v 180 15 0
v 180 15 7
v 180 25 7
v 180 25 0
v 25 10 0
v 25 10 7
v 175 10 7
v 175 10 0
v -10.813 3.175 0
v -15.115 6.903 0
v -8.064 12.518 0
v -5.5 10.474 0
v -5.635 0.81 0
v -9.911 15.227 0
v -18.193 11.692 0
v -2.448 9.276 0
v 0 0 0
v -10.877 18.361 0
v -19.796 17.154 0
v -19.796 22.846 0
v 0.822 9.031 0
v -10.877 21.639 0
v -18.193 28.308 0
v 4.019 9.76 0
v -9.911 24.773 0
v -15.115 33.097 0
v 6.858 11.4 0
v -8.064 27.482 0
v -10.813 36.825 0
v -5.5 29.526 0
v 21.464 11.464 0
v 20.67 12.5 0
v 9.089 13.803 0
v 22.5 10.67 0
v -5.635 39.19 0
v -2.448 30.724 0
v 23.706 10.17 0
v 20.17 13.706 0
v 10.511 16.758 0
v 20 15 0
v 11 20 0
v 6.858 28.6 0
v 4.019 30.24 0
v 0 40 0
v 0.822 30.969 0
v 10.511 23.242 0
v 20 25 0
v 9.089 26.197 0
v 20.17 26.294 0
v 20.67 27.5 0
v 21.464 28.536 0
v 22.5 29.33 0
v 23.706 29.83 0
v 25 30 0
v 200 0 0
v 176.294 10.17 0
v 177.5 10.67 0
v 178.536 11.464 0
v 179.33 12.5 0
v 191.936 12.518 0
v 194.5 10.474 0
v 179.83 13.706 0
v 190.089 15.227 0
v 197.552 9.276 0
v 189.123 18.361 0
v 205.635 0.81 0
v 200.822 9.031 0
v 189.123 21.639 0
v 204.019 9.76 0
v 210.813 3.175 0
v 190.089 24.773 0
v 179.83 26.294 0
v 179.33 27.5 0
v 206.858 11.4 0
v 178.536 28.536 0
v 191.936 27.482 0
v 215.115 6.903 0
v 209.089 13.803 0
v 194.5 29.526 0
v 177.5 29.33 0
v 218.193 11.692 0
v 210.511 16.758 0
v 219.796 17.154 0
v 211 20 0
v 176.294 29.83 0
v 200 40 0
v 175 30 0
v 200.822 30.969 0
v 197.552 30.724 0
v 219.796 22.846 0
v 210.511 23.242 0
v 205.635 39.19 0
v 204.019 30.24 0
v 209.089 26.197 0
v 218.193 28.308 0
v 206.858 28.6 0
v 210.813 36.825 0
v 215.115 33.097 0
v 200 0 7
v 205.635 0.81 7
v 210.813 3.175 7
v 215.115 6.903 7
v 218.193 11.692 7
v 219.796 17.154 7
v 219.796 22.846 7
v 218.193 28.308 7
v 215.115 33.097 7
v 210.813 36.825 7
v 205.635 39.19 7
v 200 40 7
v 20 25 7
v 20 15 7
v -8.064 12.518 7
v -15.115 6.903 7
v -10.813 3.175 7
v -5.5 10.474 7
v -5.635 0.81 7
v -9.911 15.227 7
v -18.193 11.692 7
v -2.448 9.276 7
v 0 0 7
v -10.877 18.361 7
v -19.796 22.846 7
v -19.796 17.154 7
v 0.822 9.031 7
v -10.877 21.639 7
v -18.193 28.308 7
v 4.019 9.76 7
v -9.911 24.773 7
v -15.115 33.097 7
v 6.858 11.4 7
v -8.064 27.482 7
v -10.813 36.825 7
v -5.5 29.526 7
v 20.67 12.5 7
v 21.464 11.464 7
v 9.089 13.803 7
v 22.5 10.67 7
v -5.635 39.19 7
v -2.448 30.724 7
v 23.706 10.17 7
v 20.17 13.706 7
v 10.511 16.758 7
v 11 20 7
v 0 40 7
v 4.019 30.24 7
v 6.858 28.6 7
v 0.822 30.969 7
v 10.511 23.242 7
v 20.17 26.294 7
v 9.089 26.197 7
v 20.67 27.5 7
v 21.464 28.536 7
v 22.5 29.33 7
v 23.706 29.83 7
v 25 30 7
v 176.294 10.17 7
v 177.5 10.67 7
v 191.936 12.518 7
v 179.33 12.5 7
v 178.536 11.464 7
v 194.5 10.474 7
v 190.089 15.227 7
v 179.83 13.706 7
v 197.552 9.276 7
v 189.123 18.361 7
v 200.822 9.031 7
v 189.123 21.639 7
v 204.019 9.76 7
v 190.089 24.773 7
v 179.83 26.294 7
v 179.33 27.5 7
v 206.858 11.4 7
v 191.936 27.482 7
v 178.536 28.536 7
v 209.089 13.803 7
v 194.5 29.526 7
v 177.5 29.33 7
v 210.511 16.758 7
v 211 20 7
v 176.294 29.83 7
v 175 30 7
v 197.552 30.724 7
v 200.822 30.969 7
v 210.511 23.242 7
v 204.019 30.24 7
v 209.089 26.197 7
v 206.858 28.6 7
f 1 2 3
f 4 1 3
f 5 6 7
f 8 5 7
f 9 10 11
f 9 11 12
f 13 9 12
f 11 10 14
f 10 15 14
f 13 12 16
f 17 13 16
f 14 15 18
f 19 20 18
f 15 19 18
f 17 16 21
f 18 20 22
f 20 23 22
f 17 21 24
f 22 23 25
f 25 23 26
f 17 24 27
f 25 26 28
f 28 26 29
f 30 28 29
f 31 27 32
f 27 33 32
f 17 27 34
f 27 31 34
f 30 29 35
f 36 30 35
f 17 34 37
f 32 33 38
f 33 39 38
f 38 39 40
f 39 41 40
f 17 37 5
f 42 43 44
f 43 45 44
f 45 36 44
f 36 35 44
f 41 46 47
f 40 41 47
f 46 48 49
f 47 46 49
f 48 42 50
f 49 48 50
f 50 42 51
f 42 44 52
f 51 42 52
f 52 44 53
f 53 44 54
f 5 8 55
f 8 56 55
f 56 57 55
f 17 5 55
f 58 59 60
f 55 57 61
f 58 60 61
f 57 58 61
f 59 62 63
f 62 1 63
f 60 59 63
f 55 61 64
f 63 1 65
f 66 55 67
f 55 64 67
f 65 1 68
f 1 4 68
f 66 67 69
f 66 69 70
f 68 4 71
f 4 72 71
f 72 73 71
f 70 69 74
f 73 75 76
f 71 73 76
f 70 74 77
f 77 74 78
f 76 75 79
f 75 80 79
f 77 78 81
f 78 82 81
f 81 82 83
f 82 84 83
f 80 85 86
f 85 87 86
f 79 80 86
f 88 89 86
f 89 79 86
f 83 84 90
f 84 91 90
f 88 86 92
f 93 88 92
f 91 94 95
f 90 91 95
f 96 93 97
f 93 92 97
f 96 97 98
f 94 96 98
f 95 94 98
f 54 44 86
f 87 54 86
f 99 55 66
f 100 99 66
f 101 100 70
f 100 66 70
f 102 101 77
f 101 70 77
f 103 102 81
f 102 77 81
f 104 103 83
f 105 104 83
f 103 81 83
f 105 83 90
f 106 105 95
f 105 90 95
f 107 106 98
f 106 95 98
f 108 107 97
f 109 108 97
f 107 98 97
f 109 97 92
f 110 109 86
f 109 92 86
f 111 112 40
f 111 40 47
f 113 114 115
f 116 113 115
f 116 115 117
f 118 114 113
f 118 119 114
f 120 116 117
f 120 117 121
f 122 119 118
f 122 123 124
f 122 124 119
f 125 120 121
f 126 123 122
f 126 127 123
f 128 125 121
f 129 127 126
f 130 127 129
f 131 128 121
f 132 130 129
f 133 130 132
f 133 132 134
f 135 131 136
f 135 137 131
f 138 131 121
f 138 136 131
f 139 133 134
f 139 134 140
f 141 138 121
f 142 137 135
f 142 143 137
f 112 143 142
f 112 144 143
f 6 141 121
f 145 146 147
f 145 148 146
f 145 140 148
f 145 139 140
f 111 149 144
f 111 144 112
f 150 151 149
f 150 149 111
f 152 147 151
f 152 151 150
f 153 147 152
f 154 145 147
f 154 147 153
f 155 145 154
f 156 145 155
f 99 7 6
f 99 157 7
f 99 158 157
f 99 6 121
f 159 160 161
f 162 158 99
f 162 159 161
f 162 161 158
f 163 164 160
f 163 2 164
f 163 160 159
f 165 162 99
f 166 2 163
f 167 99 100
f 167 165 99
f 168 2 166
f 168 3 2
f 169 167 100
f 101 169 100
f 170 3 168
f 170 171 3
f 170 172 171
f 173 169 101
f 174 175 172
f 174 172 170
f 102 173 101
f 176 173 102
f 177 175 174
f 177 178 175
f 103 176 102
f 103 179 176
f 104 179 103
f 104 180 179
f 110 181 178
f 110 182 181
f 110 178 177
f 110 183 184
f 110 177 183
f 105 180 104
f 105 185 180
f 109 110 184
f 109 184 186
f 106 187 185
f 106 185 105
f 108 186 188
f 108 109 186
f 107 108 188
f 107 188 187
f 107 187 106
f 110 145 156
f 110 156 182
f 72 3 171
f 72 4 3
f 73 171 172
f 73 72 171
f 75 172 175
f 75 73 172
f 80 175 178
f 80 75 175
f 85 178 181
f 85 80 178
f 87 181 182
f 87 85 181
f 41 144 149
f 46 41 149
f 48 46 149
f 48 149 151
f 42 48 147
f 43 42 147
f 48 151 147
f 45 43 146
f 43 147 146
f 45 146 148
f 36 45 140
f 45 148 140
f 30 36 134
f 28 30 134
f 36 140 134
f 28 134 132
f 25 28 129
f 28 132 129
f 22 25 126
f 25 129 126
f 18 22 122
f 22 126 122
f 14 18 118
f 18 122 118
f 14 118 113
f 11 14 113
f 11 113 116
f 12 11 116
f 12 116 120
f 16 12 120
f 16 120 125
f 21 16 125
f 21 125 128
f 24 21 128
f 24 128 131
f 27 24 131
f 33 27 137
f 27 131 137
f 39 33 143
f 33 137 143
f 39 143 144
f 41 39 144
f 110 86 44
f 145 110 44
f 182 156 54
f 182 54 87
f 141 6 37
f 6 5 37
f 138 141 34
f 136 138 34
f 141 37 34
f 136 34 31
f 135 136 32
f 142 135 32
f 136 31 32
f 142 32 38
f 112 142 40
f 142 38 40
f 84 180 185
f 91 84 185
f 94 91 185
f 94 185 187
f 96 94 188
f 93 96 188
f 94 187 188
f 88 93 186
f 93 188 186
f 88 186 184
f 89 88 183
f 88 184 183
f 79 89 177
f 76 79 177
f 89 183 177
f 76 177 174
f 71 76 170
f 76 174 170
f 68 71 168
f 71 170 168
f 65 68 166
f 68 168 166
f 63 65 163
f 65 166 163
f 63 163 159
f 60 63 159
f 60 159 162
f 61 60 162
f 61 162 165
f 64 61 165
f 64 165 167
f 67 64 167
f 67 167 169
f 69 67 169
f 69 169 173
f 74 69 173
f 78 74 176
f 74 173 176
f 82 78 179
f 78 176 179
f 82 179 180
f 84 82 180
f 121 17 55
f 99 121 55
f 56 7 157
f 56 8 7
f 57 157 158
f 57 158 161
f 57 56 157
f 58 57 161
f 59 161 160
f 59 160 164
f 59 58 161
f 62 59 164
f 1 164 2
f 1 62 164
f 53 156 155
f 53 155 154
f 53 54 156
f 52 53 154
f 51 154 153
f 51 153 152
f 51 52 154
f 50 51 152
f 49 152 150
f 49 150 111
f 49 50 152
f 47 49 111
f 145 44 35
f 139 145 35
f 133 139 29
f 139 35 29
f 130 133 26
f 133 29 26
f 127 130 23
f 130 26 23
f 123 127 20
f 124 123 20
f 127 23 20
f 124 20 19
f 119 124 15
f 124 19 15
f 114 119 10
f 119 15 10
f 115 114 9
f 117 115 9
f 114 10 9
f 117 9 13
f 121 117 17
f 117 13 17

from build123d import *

# Parameters (mm, degrees)
F1_DEPTH = 7
F2_R     = 11
F2_R_2   = 10
F3_DEPTH = 7
F4_W     = 160
F4_H     = 20
F5_DEPTH = 7.001
F6_R     = 5


with BuildPart() as f1:
    # F0 (on Top) → F1 (new body)
    with BuildSketch(Plane.XY):
        with BuildLine():
            Line((0, 10), (0, 0))
            Line((0, 0), (200, 0))
            Line((200, 0), (200, 10))
            ThreePointArc((200, 10), (190, 20), (200, 30))
            Line((200, 30), (200, 40))
            Line((200, 40), (0, 40))
            Line((0, 40), (0, 30))
            ThreePointArc((0, 30), (7.071068, 27.071068), (10, 20))
            ThreePointArc((10, 20), (7.071068, 12.928932), (0, 10))
        make_face()
        with BuildLine():
            ThreePointArc((0, 40), (-20, 20), (0, 0))
            Line((0, 0), (0, 10))
            ThreePointArc((0, 10), (-10, 20), (0, 30))
            Line((0, 30), (0, 40))
        make_face()
        with BuildLine():
            Line((200, 10), (200, 0))
            ThreePointArc((200, 0), (220, 20), (200, 40))
            Line((200, 40), (200, 30))
            ThreePointArc((200, 30), (207.071068, 27.071068), (210, 20))
            ThreePointArc((210, 20), (207.071068, 12.928932), (200, 10))
        make_face()
    extrude(amount=F1_DEPTH)

    # F2 (on face) → F3 (cut)
    with BuildSketch(Plane.XY.offset(7)):
        with Locations((0, 20)):
            Circle(F2_R)
        with Locations((0, 20)):
            Circle(F2_R_2, mode=Mode.SUBTRACT)
        with Locations((200, 20)):
            Circle(F2_R)
        with Locations((200, 20)):
            Circle(F2_R_2, mode=Mode.SUBTRACT)
    extrude(amount=-F3_DEPTH, mode=Mode.SUBTRACT)

    # F4 (on face) → F5 (cut, through all)
    with BuildSketch(Plane.XY.offset(7)):
        with Locations((100, 20)):
            Rectangle(F4_W, F4_H)
    extrude(amount=-F5_DEPTH, mode=Mode.SUBTRACT)

    # F6
    f6_edges = [f1.edges().sort_by_distance(p)[0] for p in [
        (20, 30, 3.5),
        (180, 30, 3.5),
        (180, 10, 3.5),
        (20, 10, 3.5),
    ]]
    fillet(f6_edges, radius=F6_R)


solid = f1.part
